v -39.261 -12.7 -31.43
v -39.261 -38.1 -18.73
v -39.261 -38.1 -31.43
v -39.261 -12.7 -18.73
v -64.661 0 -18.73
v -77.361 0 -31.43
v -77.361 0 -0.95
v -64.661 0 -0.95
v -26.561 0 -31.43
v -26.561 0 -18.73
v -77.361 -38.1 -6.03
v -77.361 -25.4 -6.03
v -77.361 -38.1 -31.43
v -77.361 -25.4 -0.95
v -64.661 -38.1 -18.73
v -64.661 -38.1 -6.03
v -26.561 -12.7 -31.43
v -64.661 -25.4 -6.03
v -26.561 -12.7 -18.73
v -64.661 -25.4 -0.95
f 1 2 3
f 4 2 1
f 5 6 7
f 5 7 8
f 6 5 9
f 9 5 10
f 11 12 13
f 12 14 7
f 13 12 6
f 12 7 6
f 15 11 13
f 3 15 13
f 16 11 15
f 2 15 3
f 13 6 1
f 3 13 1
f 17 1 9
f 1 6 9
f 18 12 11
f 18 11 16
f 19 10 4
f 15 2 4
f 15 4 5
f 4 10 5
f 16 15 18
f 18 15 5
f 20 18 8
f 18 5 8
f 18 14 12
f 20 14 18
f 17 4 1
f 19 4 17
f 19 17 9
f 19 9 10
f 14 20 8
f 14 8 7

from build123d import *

# Parameters (mm, degrees)
F1_DEPTH = 38.1
F2_W     = 12.7
F2_H     = 12.7
F3_DEPTH = 5.08
F4_W     = 12.7
F4_H     = 25.4
F5_DEPTH = 12.7


with BuildPart() as f1:
    # F0 (on Front) → F1 (new body)
    with BuildSketch(Plane.XZ):
        Polygon((-77.360854, -0.949678), (-77.360854, -31.429678), (-26.560854, -31.429678), (-26.560854, -18.729678), (-64.660854, -18.729678), (-64.660854, -0.949678), align=None)
    extrude(amount=F1_DEPTH)

    # F2 (on face) → F3 (cut)
    with BuildSketch(Plane.XY.offset(-0.949678)):
        with Locations((-71.010854, -31.75)):
            Rectangle(F2_W, F2_H)
    extrude(amount=-F3_DEPTH, mode=Mode.SUBTRACT)

    # F4 (on face) → F5 (cut)
    with BuildSketch(Plane.XY.offset(-18.729678)):
        with Locations((-32.910854, -25.4)):
            Rectangle(F4_W, F4_H)
    extrude(amount=-F5_DEPTH, mode=Mode.SUBTRACT)


solid = f1.part
